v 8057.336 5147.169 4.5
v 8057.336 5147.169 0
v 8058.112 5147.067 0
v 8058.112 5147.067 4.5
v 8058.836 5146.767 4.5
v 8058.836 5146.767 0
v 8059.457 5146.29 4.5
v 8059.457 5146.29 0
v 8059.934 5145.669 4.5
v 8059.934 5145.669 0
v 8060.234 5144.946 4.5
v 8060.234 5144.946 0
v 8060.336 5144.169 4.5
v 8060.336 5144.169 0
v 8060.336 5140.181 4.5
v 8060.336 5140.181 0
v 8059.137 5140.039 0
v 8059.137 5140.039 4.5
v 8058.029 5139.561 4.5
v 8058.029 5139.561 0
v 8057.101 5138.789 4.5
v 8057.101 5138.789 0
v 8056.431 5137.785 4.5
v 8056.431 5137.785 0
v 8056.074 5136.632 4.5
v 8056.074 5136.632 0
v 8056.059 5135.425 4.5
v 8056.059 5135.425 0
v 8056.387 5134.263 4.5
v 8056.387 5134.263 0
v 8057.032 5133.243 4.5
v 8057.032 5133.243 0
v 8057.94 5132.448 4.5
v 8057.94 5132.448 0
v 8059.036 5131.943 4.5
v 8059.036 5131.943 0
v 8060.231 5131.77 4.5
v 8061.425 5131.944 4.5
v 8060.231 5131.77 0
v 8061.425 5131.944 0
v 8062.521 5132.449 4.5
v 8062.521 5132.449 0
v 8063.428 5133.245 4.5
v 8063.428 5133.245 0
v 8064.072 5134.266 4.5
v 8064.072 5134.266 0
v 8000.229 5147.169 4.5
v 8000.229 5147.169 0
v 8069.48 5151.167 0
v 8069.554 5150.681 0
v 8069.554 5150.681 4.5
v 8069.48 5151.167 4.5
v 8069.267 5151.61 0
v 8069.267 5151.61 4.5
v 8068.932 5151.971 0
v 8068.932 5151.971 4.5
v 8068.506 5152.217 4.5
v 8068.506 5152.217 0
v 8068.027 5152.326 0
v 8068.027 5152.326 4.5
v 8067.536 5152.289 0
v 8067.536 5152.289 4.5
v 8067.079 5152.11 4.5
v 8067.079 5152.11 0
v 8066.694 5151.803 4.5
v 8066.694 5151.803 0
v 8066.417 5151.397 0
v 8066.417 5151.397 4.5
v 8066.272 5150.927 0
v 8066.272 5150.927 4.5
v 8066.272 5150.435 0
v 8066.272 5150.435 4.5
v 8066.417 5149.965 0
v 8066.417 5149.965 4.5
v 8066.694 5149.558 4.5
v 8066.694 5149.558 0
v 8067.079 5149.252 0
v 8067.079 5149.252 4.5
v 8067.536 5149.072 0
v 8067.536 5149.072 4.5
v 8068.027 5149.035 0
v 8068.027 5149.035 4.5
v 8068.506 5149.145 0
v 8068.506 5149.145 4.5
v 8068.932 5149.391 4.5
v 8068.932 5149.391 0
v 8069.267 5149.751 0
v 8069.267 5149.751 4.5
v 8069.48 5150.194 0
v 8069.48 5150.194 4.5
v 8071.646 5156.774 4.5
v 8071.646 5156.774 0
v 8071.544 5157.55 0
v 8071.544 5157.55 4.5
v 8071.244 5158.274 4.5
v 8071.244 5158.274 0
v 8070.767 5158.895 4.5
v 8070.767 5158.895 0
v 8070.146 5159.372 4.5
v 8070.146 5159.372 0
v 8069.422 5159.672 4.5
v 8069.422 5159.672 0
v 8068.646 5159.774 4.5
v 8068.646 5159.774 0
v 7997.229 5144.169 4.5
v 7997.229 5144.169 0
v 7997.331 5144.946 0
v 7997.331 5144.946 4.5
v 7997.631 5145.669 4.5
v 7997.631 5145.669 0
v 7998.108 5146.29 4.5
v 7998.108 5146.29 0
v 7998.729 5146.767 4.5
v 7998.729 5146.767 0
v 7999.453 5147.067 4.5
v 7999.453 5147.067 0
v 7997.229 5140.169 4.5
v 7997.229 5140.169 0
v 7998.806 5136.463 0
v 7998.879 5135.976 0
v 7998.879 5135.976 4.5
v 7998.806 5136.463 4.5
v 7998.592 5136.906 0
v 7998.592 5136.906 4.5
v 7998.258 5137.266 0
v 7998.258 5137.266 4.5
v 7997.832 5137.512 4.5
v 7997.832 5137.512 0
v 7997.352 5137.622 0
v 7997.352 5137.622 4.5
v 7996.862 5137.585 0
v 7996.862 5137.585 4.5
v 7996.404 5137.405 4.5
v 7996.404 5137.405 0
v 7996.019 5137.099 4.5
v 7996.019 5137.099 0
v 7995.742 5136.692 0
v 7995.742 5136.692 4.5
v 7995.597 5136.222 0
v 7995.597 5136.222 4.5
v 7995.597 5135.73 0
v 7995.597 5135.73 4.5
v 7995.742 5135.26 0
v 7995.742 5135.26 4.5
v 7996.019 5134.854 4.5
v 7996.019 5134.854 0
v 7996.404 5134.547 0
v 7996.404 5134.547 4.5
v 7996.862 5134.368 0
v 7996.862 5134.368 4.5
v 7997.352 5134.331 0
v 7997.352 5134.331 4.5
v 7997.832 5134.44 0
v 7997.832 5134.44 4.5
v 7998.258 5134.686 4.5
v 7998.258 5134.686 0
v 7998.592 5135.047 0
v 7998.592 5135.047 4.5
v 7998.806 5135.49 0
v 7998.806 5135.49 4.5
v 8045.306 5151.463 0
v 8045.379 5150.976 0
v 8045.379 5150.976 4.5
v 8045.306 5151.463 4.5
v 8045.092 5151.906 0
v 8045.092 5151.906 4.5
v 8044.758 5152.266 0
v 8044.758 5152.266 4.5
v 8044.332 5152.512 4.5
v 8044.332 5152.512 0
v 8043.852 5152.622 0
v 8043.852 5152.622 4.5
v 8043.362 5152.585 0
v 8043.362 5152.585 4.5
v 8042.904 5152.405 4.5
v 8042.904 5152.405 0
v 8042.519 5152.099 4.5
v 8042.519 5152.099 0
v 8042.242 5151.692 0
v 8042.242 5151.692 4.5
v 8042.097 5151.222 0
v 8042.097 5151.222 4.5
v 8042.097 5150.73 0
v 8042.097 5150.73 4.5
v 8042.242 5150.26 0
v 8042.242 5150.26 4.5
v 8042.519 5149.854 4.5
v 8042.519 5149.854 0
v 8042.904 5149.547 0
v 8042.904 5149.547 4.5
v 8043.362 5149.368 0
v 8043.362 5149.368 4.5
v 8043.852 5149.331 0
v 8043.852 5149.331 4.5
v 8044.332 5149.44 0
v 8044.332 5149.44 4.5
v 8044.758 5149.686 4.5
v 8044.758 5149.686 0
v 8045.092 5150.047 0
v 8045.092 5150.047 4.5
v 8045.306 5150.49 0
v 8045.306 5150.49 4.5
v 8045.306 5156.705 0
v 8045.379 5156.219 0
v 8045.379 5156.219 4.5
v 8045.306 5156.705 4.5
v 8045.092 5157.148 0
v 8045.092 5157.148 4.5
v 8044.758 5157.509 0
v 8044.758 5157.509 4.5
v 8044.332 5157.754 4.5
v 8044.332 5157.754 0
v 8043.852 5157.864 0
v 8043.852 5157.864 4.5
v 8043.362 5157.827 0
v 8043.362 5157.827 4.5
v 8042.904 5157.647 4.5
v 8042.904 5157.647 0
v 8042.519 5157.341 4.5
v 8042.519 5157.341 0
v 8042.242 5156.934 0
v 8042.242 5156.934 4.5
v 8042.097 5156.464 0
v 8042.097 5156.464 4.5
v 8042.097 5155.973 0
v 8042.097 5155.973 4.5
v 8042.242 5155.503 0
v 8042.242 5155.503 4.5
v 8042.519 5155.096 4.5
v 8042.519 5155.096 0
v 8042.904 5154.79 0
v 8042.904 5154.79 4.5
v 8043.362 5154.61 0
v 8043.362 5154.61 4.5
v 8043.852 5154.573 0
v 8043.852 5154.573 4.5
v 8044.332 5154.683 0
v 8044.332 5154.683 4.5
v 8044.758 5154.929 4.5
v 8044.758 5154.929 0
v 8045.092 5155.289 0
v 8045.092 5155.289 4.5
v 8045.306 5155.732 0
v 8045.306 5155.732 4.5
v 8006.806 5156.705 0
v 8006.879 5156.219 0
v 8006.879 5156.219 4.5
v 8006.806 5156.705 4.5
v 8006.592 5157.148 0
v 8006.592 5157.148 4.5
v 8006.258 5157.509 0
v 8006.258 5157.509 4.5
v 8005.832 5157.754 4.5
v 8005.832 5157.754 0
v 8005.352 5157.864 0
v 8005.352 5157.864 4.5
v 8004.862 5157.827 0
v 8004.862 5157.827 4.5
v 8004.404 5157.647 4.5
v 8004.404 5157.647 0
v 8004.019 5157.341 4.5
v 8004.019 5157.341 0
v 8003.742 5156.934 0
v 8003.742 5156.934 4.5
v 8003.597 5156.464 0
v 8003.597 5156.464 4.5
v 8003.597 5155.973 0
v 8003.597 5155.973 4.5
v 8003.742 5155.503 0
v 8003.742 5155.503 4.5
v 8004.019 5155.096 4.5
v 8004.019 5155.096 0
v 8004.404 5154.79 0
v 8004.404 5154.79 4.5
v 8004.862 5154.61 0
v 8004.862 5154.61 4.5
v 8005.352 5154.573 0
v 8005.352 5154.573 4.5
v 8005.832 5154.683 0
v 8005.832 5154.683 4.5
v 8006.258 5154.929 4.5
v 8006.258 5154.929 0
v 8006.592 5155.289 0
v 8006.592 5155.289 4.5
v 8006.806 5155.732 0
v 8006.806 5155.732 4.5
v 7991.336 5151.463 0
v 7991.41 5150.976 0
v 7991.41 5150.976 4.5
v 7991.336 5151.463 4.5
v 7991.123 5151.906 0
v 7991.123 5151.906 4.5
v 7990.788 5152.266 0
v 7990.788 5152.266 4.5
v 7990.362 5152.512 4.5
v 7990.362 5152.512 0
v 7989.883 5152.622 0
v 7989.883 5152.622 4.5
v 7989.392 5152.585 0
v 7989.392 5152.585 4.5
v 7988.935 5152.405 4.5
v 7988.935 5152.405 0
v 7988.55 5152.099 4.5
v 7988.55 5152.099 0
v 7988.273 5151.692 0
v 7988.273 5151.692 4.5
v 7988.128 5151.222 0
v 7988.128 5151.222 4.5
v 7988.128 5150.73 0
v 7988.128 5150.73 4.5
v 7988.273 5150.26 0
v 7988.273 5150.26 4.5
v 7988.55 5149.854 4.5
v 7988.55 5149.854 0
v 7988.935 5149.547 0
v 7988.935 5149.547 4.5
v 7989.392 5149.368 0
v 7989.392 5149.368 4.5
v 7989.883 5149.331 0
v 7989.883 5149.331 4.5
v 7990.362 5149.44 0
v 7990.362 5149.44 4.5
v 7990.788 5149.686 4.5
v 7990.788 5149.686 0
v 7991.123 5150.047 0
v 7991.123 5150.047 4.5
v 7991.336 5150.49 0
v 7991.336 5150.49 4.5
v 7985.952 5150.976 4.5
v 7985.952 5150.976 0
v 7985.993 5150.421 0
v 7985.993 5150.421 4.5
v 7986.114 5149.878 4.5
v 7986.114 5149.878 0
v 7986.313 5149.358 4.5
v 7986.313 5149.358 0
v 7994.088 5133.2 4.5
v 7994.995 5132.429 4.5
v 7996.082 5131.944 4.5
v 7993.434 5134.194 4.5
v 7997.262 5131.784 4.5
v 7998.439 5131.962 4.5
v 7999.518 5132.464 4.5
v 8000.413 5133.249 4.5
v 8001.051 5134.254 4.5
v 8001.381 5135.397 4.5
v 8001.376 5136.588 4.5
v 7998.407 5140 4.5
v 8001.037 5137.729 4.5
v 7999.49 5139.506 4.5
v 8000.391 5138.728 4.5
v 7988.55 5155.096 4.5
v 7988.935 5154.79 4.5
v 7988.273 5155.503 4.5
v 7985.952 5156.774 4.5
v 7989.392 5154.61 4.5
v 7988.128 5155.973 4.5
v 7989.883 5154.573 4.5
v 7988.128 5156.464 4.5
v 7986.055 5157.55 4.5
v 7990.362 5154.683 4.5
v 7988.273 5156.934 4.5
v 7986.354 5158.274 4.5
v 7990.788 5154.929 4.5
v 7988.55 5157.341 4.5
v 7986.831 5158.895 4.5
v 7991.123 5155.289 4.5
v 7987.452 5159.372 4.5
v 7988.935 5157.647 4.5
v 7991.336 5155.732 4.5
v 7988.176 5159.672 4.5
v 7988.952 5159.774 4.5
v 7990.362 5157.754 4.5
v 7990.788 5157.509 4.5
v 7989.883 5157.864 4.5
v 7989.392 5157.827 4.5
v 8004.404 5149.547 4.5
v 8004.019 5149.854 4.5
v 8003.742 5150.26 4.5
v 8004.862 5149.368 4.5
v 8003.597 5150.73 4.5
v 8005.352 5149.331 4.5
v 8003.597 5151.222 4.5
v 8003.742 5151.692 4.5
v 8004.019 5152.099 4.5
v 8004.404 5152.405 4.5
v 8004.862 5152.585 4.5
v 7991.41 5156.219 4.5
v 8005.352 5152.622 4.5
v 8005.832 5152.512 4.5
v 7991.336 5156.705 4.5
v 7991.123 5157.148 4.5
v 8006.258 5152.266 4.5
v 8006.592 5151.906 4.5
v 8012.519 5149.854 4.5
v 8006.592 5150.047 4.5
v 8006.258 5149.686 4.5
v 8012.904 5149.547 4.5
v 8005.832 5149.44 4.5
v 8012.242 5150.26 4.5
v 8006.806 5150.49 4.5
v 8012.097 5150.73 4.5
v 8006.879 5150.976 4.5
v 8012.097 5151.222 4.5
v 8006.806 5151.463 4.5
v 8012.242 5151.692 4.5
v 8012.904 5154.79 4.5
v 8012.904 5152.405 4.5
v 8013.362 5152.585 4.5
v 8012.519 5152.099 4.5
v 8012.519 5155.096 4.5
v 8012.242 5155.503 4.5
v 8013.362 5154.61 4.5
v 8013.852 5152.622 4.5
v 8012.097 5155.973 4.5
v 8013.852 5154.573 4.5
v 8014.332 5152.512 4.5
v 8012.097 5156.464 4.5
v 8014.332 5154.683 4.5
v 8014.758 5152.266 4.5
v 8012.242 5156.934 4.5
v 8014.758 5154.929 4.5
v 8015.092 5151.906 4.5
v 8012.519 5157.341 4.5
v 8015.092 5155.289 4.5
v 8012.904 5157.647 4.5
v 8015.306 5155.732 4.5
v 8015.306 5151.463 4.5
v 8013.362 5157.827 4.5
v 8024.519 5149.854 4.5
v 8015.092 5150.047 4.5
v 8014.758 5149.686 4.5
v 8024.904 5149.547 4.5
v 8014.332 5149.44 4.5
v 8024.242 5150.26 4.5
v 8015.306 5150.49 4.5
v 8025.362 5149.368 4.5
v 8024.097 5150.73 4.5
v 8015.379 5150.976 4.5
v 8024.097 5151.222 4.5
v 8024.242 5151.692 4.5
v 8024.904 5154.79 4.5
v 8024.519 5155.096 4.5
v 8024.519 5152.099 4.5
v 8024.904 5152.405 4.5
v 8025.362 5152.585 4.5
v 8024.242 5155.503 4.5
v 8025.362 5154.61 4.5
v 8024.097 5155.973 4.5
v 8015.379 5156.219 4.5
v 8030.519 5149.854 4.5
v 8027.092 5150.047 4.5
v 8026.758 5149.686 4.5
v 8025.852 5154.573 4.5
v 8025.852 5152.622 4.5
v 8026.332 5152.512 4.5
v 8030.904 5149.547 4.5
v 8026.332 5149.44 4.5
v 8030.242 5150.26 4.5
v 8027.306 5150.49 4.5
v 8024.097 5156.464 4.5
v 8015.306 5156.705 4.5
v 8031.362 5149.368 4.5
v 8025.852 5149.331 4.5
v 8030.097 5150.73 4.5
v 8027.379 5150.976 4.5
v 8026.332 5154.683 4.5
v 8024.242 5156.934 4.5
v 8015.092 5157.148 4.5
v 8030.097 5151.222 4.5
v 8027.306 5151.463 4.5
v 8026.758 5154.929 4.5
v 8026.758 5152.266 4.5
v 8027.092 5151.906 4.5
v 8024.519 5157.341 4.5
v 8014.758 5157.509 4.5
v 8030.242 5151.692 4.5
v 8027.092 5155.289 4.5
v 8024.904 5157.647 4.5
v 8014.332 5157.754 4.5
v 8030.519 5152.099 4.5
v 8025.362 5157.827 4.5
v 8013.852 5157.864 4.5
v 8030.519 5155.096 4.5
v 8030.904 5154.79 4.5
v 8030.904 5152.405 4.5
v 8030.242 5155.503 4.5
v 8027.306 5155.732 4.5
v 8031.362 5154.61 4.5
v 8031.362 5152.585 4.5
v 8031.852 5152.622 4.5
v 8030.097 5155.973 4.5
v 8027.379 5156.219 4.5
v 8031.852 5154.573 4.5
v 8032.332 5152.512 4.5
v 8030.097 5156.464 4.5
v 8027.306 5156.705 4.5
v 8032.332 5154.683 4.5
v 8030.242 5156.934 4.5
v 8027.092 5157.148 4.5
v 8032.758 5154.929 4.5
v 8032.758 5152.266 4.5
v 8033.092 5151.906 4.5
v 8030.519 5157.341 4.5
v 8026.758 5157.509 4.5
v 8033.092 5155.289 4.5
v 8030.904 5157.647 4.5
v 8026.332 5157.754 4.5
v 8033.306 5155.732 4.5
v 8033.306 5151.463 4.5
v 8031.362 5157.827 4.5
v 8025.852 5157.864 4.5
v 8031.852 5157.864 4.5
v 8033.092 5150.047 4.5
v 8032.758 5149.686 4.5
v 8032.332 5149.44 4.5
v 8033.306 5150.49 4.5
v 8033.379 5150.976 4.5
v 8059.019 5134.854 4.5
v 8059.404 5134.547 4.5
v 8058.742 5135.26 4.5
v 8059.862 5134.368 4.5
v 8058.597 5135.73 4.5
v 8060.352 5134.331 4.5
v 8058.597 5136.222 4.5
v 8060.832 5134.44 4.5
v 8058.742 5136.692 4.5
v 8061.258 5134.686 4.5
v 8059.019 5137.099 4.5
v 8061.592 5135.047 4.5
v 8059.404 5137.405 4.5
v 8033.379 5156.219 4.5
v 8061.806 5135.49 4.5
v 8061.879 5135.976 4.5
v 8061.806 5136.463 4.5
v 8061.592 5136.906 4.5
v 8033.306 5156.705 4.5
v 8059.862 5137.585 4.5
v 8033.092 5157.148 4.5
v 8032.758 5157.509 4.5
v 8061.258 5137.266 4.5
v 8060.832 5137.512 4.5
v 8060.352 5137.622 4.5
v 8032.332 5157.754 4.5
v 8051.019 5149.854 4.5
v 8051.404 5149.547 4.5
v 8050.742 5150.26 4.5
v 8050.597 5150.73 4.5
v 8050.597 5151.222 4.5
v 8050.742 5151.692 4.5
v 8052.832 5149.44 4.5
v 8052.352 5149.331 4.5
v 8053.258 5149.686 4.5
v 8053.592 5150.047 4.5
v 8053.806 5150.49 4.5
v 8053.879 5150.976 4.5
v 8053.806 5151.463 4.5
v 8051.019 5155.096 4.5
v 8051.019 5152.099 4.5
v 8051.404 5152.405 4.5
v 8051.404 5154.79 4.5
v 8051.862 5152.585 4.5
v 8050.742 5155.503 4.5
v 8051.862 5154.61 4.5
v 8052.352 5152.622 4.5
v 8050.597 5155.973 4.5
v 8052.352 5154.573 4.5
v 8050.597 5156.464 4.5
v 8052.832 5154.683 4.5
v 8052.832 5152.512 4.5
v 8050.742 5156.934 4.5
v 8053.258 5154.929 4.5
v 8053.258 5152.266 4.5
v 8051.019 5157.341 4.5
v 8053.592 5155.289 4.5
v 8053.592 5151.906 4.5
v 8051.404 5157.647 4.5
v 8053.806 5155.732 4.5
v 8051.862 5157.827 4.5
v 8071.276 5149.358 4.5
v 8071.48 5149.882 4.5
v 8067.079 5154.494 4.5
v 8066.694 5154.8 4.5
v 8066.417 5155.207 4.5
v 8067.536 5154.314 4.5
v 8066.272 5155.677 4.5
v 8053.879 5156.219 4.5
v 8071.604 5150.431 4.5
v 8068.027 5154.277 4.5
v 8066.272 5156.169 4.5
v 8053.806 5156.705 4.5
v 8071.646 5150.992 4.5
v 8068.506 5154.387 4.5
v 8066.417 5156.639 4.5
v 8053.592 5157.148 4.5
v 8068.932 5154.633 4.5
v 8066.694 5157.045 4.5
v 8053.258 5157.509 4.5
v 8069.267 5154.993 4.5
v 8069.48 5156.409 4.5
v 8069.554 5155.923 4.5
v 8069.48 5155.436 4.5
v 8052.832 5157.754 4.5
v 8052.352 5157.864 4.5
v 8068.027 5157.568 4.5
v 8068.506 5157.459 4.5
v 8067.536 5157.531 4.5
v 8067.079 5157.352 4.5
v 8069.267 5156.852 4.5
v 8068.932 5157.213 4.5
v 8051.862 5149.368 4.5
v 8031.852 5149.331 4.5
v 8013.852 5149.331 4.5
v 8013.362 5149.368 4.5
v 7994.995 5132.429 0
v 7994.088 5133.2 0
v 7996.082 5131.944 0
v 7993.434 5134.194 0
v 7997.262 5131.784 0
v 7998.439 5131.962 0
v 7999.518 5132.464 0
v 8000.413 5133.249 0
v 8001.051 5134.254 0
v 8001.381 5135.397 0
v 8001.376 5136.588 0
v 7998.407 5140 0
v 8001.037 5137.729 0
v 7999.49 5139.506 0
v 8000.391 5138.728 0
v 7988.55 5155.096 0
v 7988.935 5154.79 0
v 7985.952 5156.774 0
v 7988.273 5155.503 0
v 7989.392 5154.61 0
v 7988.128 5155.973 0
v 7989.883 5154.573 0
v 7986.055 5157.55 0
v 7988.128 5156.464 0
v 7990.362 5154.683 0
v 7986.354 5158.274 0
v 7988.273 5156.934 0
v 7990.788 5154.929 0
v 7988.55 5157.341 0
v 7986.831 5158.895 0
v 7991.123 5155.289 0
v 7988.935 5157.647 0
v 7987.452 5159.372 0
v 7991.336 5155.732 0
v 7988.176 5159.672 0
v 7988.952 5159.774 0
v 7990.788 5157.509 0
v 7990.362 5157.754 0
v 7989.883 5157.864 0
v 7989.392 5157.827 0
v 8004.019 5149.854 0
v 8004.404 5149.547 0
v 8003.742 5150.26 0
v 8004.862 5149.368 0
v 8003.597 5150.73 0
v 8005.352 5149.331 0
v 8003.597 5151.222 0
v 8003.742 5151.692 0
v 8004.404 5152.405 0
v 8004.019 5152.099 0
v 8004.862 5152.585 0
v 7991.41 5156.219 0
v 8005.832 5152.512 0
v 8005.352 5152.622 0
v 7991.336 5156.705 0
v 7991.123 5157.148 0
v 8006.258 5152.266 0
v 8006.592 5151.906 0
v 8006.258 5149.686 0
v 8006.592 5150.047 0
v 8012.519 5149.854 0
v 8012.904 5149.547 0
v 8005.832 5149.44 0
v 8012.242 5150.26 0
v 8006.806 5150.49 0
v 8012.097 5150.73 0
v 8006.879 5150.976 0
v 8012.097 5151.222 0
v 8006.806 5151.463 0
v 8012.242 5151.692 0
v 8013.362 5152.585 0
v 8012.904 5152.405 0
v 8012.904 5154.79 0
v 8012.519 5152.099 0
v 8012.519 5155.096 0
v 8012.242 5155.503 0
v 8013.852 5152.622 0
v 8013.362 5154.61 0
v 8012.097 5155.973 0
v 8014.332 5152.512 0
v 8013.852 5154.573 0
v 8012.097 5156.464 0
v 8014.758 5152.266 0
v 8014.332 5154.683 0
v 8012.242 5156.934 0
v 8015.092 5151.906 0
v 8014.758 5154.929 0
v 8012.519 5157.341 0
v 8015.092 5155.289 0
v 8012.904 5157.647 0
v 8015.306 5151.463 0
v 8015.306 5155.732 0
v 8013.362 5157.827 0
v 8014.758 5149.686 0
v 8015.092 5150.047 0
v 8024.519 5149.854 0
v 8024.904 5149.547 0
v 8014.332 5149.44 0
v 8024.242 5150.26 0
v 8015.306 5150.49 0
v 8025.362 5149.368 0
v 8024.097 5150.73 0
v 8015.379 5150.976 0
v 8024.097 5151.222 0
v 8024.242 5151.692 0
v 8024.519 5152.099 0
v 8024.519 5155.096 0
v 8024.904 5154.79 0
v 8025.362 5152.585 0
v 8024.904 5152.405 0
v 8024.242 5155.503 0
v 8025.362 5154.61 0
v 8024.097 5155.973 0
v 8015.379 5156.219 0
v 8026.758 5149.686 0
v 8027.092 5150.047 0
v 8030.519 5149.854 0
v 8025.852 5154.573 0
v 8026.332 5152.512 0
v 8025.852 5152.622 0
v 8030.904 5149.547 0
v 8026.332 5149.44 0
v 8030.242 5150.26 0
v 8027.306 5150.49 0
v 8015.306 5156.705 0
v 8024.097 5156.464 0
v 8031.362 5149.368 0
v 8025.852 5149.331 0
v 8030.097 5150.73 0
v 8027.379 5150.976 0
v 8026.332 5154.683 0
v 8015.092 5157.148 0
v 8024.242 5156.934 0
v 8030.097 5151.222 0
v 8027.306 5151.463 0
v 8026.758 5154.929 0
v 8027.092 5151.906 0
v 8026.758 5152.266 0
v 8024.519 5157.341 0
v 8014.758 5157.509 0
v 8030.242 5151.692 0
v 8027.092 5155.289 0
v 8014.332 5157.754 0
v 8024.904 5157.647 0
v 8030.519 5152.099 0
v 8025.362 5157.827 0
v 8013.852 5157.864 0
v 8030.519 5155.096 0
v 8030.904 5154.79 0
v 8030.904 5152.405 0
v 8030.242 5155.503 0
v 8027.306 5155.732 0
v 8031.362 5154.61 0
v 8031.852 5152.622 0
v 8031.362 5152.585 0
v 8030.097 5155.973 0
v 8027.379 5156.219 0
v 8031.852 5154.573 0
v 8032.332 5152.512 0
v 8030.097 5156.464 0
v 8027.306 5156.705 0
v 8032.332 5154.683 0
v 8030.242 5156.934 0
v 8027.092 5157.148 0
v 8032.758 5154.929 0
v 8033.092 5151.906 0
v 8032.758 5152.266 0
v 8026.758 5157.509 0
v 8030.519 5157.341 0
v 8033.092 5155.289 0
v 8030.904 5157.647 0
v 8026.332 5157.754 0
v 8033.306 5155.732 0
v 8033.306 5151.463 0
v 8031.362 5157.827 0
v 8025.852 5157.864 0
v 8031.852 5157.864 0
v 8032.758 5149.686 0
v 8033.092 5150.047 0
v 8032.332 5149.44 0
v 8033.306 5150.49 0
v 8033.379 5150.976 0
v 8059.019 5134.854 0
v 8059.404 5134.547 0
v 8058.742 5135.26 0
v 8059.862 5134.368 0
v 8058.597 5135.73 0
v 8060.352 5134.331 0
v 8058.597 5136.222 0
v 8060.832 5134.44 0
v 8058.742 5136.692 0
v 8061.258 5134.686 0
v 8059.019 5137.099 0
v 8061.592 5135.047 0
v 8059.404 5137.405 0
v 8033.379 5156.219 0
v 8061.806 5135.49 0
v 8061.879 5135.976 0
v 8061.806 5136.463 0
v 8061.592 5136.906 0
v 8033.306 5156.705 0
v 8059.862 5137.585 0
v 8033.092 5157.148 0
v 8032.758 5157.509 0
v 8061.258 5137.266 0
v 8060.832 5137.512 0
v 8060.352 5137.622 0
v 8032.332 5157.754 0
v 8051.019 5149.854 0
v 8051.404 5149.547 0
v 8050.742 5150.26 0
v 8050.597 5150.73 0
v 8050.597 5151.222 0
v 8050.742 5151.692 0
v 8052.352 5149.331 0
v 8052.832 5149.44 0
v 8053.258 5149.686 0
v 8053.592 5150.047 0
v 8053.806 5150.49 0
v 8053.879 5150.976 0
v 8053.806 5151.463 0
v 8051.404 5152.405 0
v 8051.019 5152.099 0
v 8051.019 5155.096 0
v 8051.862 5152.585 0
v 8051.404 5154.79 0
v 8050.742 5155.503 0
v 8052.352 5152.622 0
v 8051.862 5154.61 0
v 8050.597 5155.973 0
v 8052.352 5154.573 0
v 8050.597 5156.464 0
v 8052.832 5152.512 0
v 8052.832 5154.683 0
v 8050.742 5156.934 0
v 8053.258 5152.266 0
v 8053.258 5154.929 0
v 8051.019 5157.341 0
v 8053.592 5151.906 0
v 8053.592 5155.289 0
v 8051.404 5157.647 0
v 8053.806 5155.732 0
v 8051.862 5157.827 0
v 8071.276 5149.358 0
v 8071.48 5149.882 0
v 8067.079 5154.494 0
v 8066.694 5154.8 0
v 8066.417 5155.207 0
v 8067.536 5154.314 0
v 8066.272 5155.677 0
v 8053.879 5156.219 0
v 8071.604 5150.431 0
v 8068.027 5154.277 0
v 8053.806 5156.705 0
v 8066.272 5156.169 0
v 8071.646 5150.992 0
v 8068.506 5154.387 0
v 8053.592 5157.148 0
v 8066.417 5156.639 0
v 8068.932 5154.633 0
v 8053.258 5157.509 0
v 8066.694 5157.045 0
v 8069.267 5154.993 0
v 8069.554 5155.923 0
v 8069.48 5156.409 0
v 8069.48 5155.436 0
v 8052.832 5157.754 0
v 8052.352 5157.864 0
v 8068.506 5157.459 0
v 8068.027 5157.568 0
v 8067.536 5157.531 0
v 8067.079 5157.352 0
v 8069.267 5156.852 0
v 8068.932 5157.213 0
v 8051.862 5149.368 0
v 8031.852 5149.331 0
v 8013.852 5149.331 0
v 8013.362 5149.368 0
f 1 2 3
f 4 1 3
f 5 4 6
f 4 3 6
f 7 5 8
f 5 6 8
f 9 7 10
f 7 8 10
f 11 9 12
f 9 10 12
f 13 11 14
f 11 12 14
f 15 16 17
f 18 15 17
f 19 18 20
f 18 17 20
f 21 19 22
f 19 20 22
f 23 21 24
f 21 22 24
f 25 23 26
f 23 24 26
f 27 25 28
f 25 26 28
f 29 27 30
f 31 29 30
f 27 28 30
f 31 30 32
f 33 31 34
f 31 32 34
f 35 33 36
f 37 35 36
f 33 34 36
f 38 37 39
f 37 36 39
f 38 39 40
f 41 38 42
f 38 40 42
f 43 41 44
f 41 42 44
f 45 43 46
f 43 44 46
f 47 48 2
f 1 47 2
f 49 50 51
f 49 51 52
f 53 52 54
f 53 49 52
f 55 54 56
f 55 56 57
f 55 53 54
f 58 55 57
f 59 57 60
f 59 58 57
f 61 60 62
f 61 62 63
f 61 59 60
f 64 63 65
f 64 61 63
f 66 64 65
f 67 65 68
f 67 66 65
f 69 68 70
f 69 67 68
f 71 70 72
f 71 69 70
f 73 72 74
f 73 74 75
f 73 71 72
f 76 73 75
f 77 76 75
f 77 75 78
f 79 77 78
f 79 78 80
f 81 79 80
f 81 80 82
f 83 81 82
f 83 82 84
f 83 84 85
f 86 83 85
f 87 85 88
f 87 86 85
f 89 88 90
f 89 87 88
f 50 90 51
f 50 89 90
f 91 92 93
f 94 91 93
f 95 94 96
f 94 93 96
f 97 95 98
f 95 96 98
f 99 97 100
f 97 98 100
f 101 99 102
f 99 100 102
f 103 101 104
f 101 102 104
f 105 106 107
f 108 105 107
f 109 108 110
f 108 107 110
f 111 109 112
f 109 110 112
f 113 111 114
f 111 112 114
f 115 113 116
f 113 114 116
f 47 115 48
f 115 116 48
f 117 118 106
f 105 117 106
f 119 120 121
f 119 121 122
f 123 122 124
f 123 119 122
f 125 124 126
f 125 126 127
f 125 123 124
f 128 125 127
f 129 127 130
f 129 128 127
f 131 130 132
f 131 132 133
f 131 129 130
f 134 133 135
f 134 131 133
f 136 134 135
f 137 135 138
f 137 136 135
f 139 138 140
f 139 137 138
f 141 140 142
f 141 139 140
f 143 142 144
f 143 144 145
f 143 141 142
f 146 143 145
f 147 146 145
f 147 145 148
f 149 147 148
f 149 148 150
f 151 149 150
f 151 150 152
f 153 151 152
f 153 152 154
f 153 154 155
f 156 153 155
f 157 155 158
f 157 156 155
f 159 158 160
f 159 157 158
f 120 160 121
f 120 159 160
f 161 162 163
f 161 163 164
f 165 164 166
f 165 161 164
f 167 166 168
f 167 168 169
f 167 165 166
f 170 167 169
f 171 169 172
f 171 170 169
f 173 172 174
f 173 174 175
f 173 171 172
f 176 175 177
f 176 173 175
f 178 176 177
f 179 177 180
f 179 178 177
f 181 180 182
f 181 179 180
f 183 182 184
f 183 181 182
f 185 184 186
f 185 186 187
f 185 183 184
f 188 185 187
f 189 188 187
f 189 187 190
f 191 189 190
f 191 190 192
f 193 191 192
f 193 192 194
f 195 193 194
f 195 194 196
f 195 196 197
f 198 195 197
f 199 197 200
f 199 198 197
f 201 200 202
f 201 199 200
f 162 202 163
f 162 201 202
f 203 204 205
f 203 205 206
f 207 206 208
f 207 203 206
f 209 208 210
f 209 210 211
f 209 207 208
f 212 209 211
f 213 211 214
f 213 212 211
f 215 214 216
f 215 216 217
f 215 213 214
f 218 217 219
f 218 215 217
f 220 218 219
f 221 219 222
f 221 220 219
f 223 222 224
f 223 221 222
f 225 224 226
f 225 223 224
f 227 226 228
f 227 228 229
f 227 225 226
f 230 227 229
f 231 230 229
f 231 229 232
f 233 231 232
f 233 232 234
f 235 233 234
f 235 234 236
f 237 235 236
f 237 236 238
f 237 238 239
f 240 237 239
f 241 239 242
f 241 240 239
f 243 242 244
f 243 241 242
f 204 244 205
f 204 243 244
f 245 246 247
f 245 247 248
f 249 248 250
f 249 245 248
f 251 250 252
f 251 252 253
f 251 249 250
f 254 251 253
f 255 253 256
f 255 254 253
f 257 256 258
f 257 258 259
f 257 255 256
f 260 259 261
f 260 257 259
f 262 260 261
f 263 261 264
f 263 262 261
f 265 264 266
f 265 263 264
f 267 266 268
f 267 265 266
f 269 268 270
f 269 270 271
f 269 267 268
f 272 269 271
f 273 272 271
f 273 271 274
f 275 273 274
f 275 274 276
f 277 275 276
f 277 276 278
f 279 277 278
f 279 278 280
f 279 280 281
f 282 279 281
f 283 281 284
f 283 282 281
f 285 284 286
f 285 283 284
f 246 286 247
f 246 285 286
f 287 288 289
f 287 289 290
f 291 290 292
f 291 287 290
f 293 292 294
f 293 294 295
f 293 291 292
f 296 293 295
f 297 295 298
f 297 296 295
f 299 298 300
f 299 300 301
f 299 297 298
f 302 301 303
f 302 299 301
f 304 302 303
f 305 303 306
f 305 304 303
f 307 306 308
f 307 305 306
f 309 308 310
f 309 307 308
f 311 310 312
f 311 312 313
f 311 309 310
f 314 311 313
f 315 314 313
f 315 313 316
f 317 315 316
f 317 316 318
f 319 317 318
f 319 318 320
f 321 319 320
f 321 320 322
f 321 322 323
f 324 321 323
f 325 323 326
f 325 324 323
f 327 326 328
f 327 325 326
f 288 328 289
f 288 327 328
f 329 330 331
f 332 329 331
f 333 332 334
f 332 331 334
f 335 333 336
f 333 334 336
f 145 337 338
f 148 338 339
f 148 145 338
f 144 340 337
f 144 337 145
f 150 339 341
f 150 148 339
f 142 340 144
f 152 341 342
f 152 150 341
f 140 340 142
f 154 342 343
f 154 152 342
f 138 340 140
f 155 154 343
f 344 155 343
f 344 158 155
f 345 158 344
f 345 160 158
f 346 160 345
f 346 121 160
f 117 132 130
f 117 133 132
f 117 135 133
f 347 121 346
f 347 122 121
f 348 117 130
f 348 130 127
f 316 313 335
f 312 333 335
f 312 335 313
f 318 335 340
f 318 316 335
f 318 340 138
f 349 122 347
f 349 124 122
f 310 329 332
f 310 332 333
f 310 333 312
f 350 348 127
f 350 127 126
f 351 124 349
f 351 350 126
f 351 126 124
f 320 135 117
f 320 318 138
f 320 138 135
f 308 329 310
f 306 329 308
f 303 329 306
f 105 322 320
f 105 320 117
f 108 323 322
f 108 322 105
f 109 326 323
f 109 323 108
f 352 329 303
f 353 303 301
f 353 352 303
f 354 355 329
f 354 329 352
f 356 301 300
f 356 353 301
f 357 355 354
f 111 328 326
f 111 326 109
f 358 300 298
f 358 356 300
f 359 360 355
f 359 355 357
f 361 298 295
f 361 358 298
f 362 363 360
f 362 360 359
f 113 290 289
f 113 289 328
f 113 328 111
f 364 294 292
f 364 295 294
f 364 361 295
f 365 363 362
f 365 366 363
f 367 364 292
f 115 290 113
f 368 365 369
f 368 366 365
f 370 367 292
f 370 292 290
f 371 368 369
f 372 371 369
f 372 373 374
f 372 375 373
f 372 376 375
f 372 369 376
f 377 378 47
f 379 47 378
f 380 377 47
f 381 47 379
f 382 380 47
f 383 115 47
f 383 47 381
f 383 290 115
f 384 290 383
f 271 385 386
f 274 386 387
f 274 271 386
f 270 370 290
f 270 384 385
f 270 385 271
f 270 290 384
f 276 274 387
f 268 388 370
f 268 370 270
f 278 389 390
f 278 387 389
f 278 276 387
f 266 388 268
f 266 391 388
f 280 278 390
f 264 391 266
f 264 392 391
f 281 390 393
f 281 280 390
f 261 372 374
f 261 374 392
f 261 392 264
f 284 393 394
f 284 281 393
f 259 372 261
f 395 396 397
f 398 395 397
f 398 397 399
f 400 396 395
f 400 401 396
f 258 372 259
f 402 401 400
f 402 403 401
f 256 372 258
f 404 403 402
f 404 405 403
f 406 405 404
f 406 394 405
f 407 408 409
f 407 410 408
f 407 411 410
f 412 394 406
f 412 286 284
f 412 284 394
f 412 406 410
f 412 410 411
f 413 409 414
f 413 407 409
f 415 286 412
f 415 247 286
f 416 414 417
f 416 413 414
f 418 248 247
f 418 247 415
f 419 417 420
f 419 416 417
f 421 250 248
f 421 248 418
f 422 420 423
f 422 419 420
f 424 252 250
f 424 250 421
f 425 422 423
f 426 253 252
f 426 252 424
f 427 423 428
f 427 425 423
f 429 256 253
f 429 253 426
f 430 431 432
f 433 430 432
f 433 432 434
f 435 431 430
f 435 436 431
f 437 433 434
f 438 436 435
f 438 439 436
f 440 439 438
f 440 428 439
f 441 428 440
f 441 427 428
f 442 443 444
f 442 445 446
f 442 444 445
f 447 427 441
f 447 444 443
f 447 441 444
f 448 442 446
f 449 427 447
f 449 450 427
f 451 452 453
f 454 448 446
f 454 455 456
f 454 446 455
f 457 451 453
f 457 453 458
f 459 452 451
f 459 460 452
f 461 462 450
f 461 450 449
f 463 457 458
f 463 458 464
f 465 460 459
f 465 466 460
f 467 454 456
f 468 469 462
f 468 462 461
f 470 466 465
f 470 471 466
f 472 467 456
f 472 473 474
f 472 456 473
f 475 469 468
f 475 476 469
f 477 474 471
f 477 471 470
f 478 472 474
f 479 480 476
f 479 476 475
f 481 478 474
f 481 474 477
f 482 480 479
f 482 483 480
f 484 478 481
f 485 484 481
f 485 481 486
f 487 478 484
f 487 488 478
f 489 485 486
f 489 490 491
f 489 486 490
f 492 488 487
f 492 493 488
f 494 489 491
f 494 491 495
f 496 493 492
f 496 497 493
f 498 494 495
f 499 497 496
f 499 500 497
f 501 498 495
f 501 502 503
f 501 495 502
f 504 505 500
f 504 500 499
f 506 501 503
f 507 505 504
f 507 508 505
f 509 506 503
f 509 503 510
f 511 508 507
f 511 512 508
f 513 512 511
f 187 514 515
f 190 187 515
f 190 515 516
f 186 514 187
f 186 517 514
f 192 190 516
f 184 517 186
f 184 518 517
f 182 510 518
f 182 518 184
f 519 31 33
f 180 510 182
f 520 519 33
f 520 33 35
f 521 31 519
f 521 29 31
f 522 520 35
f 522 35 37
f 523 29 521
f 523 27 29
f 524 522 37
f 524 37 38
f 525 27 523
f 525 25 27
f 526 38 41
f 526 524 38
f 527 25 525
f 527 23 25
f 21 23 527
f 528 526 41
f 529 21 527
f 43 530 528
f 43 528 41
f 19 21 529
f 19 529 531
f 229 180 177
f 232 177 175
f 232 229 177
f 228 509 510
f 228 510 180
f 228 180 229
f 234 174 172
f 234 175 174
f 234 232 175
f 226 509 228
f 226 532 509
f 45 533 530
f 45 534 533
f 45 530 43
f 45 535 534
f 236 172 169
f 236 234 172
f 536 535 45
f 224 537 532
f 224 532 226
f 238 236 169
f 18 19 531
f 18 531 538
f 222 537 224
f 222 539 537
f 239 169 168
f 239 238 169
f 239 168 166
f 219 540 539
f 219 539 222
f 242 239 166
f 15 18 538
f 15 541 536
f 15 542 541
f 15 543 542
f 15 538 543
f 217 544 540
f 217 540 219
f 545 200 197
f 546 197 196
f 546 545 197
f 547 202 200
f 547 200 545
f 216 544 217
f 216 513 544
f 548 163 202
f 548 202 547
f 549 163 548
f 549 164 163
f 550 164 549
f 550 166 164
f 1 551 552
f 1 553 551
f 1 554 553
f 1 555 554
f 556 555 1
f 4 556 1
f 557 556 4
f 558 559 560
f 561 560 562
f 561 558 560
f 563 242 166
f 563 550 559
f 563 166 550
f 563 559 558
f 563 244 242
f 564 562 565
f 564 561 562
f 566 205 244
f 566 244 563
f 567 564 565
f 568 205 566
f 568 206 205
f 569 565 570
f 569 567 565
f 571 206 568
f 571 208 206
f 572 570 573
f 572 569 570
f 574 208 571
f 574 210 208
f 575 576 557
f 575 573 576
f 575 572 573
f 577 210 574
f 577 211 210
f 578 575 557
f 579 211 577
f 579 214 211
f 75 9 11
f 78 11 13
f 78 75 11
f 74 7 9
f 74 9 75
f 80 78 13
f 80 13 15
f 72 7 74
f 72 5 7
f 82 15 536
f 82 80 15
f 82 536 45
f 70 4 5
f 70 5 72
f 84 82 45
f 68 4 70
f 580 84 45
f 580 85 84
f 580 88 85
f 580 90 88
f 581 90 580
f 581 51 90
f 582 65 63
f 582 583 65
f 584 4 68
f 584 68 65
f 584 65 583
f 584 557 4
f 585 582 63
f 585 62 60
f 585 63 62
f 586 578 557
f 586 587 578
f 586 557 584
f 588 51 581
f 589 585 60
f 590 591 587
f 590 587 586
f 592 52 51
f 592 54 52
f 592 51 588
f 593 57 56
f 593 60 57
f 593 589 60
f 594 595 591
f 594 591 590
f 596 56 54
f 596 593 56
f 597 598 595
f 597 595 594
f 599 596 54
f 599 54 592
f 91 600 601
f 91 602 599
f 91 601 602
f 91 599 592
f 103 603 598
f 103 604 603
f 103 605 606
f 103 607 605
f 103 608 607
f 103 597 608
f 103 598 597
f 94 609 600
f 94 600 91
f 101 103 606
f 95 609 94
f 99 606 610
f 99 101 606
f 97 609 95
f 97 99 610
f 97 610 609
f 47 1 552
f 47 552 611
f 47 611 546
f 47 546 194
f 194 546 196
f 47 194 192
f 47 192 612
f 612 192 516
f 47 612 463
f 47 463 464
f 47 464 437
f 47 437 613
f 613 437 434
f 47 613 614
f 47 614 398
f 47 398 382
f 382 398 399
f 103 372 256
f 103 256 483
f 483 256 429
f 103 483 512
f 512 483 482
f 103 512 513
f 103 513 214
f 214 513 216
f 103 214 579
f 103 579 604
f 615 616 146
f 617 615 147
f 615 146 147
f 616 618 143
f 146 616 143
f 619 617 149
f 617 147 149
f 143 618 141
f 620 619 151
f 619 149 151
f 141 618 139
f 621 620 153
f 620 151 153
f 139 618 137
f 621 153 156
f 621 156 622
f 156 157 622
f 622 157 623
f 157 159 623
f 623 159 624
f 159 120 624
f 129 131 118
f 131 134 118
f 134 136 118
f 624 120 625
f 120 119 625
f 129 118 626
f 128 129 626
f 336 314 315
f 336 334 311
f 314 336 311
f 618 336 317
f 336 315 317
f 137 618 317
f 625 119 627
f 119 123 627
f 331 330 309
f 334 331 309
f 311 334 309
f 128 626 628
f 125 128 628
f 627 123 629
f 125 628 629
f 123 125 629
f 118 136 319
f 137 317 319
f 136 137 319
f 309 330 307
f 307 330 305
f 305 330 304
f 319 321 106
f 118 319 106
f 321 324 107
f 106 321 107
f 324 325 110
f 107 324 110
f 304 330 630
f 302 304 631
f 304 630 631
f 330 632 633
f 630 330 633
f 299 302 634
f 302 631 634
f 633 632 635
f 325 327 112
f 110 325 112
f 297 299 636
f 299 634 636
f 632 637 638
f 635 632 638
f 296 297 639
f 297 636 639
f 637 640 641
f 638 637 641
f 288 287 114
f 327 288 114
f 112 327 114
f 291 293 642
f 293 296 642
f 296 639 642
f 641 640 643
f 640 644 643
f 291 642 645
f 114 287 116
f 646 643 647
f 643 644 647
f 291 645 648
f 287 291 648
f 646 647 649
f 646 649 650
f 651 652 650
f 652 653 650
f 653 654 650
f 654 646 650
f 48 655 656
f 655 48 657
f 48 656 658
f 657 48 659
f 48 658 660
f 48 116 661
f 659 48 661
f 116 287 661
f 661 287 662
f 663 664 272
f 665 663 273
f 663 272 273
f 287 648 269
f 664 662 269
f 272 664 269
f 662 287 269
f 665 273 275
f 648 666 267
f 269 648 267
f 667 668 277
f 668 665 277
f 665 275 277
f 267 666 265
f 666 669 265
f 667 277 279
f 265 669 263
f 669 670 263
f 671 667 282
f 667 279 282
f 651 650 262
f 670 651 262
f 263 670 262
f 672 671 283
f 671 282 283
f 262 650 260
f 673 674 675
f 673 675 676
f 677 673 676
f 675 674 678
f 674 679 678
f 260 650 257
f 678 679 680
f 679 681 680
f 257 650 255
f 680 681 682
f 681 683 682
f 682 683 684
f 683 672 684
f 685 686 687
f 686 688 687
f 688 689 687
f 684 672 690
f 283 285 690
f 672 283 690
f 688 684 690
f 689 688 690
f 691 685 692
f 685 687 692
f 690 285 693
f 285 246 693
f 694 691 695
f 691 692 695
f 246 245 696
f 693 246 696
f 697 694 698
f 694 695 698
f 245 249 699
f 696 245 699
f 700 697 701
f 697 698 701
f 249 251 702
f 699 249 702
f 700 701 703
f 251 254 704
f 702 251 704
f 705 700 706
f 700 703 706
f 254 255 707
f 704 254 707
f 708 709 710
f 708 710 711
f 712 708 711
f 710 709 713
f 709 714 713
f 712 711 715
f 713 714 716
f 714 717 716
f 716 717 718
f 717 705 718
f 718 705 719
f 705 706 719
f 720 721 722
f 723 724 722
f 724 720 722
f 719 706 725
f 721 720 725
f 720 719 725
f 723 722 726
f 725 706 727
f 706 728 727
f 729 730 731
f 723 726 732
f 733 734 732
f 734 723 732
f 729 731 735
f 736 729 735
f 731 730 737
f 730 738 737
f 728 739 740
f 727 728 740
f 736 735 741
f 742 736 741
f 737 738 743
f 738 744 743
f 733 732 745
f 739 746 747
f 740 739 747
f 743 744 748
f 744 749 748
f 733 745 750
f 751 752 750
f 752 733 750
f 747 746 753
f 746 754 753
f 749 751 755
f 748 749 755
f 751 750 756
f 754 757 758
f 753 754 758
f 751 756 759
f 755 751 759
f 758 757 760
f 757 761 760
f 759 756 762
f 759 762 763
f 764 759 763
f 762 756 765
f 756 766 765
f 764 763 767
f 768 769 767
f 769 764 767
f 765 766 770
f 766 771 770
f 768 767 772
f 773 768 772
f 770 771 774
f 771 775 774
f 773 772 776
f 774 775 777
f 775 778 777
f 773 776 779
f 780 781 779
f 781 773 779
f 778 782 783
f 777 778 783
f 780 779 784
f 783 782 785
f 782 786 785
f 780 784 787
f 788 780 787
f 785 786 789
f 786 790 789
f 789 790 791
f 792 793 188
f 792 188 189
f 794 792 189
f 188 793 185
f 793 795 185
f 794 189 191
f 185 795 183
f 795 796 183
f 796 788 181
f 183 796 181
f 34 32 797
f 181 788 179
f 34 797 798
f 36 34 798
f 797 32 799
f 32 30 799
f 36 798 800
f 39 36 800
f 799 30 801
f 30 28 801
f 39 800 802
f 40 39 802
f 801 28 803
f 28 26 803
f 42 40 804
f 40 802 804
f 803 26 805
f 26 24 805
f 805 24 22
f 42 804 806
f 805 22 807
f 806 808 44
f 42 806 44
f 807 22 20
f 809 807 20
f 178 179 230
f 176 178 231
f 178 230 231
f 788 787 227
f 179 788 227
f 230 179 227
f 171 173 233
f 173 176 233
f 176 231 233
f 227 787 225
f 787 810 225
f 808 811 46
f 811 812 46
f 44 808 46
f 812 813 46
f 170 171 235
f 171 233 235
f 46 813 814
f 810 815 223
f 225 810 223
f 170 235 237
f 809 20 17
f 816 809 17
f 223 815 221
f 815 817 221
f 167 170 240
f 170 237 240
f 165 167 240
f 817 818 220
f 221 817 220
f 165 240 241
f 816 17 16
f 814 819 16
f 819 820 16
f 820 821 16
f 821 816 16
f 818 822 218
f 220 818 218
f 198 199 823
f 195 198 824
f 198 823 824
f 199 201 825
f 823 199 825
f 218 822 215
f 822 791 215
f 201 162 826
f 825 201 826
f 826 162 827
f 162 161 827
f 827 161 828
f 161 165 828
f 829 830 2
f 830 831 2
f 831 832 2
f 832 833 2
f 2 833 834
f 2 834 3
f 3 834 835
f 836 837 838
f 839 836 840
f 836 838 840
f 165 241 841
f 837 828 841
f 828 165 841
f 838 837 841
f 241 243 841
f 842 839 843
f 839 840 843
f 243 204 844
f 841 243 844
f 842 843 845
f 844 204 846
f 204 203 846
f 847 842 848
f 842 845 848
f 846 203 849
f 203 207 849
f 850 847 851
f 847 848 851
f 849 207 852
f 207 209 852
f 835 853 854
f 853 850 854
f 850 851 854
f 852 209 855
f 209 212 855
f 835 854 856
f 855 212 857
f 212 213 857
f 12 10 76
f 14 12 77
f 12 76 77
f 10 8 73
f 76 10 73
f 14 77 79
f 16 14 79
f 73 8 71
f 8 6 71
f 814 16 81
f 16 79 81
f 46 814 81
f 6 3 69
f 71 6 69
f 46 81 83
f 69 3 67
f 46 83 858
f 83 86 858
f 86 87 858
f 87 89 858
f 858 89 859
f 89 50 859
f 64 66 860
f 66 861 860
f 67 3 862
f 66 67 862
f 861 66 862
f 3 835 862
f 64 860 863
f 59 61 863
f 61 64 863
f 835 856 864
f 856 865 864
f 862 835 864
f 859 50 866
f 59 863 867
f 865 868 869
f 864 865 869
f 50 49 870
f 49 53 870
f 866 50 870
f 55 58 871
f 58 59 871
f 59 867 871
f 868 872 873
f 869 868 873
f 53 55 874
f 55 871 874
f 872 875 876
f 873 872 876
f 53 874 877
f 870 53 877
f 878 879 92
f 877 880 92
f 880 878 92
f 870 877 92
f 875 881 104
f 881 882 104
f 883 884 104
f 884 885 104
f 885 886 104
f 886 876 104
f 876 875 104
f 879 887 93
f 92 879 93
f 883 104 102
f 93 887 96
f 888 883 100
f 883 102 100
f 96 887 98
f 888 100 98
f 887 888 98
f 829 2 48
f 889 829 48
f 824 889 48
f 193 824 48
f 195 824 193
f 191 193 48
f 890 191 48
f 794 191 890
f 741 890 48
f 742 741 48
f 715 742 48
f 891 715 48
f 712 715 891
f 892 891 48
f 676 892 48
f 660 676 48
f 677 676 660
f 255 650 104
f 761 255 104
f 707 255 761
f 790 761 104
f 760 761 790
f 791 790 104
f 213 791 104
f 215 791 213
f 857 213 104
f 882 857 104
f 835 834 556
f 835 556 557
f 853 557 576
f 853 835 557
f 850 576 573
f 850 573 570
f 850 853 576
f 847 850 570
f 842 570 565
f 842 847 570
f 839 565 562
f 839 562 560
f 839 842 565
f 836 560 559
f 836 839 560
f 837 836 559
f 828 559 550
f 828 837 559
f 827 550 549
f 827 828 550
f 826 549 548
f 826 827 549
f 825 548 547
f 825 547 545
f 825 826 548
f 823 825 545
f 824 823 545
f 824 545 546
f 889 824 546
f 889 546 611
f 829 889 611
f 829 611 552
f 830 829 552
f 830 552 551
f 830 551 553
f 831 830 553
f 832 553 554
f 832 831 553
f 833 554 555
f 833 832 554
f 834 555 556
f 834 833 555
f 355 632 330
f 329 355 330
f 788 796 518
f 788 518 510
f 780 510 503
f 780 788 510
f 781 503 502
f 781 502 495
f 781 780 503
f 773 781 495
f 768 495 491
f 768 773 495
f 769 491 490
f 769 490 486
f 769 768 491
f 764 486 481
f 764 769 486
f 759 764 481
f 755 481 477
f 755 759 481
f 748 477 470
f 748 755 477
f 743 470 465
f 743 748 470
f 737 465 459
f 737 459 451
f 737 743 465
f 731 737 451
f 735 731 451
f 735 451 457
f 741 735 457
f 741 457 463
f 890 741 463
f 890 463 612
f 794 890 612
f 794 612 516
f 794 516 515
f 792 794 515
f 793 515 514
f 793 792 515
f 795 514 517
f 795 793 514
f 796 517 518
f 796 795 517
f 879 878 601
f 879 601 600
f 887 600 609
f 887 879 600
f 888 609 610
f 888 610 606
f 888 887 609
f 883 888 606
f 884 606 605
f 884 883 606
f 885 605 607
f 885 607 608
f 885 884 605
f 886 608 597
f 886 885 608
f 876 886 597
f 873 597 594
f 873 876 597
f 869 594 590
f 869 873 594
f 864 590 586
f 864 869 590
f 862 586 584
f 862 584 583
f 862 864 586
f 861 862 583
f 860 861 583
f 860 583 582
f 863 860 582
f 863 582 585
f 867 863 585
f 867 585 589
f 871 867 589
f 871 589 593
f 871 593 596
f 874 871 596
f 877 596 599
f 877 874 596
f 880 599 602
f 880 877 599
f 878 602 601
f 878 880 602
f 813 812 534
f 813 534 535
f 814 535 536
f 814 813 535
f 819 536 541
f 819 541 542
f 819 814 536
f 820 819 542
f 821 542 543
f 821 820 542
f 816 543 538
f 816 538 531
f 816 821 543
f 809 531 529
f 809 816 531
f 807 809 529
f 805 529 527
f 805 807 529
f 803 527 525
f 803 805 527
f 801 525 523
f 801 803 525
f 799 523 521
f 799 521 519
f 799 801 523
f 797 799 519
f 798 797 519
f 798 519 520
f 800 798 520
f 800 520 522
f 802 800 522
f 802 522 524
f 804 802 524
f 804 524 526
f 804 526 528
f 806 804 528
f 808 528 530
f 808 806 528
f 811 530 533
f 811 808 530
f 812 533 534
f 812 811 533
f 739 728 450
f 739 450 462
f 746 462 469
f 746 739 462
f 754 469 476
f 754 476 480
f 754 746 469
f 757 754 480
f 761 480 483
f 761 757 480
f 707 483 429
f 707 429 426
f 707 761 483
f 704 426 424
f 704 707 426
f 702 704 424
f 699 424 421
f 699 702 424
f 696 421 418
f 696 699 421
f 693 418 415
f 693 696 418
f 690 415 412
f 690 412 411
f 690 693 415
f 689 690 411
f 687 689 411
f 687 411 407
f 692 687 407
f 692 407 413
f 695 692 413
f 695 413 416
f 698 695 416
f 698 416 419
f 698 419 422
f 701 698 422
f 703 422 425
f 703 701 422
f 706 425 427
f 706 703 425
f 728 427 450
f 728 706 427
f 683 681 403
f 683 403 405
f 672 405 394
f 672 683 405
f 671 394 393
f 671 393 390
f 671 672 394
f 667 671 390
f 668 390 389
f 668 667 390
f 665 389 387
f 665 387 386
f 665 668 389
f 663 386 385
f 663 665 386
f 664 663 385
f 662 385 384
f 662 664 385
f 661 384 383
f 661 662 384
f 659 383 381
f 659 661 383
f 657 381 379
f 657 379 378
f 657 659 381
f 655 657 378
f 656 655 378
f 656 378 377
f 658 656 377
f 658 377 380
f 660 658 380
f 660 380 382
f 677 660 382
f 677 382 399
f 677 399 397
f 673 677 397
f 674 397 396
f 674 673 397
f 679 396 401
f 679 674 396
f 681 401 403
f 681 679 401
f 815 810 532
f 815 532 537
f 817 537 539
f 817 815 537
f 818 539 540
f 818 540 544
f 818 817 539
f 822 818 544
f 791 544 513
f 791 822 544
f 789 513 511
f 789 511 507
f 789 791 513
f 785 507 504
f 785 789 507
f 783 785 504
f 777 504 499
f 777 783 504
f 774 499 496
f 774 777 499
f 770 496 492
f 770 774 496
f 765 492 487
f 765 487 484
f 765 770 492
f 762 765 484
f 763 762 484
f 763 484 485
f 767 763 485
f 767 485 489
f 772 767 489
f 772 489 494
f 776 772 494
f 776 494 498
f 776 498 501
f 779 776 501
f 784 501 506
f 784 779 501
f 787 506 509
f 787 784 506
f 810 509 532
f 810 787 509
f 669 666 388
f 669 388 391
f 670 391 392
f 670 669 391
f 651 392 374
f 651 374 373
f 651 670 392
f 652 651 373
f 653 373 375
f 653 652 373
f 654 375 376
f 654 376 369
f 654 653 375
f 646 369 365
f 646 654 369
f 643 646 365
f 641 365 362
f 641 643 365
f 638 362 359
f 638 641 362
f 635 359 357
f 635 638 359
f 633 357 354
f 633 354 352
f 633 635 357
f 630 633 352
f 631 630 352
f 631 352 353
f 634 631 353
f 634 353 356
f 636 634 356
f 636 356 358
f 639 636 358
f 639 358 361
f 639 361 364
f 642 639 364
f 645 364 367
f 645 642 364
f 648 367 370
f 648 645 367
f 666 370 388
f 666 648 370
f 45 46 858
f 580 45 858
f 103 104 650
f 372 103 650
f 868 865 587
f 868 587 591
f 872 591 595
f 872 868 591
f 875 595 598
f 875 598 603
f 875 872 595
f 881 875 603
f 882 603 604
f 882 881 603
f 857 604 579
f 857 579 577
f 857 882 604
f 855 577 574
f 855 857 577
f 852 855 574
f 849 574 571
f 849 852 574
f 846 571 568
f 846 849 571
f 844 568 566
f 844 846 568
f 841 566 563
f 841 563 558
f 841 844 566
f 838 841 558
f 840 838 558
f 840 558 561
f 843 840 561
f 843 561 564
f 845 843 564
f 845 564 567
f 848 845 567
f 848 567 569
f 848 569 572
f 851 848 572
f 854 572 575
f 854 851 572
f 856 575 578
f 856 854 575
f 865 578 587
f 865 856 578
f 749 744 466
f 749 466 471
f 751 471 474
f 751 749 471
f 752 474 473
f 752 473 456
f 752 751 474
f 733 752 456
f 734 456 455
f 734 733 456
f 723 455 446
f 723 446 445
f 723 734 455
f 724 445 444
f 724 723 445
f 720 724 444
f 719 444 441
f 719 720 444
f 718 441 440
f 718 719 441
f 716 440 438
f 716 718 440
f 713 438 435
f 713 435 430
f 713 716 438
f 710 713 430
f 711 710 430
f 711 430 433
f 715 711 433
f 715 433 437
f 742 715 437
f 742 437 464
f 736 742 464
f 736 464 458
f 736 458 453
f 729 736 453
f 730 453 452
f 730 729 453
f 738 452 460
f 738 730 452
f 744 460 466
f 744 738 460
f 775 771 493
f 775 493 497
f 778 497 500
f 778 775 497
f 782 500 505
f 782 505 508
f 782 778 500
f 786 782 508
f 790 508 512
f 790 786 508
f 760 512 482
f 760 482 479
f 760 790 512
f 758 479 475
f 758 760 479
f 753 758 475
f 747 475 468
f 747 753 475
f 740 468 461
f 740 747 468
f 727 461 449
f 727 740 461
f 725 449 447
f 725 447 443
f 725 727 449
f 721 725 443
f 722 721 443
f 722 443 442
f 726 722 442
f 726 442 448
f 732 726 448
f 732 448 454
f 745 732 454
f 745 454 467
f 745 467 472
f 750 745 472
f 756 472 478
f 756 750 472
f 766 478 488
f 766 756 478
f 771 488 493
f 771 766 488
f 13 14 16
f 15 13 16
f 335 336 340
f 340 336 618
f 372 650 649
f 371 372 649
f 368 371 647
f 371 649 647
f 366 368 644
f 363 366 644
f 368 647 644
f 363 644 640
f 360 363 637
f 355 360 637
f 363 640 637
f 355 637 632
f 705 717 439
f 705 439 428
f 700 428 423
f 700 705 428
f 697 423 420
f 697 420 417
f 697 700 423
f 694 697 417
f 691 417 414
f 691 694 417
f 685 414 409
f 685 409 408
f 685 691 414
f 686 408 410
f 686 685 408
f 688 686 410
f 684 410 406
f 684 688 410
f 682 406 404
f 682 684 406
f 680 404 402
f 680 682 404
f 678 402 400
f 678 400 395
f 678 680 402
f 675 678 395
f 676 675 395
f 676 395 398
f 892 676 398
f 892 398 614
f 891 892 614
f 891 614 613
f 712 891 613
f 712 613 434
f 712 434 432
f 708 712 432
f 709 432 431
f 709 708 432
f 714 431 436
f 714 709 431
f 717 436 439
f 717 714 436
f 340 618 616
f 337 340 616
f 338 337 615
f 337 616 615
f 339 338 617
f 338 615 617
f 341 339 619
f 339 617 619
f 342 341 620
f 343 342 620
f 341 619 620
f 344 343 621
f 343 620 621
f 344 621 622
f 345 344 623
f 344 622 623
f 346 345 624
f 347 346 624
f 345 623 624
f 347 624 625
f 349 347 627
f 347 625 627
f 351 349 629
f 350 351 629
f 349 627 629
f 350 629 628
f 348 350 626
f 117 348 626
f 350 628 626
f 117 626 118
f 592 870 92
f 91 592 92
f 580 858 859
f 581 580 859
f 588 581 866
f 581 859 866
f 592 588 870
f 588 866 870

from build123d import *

# Parameters (mm, degrees)
SKETCH_1_R      = 1.65
EXTRUDE_1_DEPTH = 4.5


with BuildPart() as part:
    # 草图1 → 凸台-拉伸1 (new body)
    with BuildSketch(Plane.XY):
        with BuildLine():
            Line((7985.952332202, 5156.773837904), (7985.952332202, 5150.976359203))
            ThreePointArc((7985.952332202, 5150.976359203), (7986.043696587, 5150.147298626), (7986.313404682, 5149.358029069))
            Line((7986.313404682, 5149.358029069), (7993.434341187, 5134.194369164))
            ThreePointArc((7993.434341187, 5134.194369164), (8000.767739464, 5133.728654178), (7997.228995286, 5140.168600636))
            Line((7997.228995286, 5140.168600636), (7997.228995286, 5144.169137786))
            ThreePointArc((7997.228995286, 5144.169137786), (7998.107674943, 5146.290458129), (8000.228995286, 5147.169137786))
            Line((8000.228995286, 5147.169137786), (8057.335847124, 5147.169137786))
            ThreePointArc((8057.335847124, 5147.169137786), (8059.457167467, 5146.290458129), (8060.335847124, 5144.169137786))
            Line((8060.335847124, 5144.169137786), (8060.335847124, 5140.181434516))
            ThreePointArc((8060.335847124, 5140.181434516), (8056.672629109, 5133.729954227), (8064.072159737, 5134.266340868))
            Line((8064.072159737, 5134.266340868), (8071.275990148, 5149.357818804))
            ThreePointArc((8071.275990148, 5149.357818804), (8071.552278457, 5150.153987911), (8071.645915883, 5150.991515528))
            Line((8071.645915883, 5150.991515528), (8071.645915883, 5156.773837904))
            ThreePointArc((8071.645915883, 5156.773837904), (8070.767236227, 5158.895158248), (8068.645915883, 5159.773837904))
            Line((8068.645915883, 5159.773837904), (7988.952332202, 5159.773837904))
            ThreePointArc((7988.952332202, 5159.773837904), (7986.831011858, 5158.895158248), (7985.952332202, 5156.773837904))
        make_face()
        with Locations((7997.228995286, 5135.976359203)):
            Circle(SKETCH_1_R, mode=Mode.SUBTRACT)
        with Locations((8005.228995286, 5150.976359203)):
            Circle(SKETCH_1_R, mode=Mode.SUBTRACT)
        with Locations((8052.228995286, 5150.976359203)):
            Circle(SKETCH_1_R, mode=Mode.SUBTRACT)
        with Locations((8013.728995286, 5150.976359203)):
            Circle(SKETCH_1_R, mode=Mode.SUBTRACT)
        with Locations((8043.728995286, 5150.976359203)):
            Circle(SKETCH_1_R, mode=Mode.SUBTRACT)
        with Locations((8060.228995286, 5135.976359203)):
            Circle(SKETCH_1_R, mode=Mode.SUBTRACT)
        with Locations((7989.759553619, 5150.976359203)):
            Circle(SKETCH_1_R, mode=Mode.SUBTRACT)
        with Locations((8067.903645142, 5150.680599992)):
            Circle(SKETCH_1_R, mode=Mode.SUBTRACT)
        with Locations((8025.728995286, 5150.976359203)):
            Circle(SKETCH_1_R, mode=Mode.SUBTRACT)
        with Locations((8031.728995286, 5150.976359203)):
            Circle(SKETCH_1_R, mode=Mode.SUBTRACT)
        with Locations((8005.228995286, 5156.218532456)):
            Circle(SKETCH_1_R, mode=Mode.SUBTRACT)
        with Locations((8052.228995286, 5156.218532456)):
            Circle(SKETCH_1_R, mode=Mode.SUBTRACT)
        with Locations((8013.728995286, 5156.218532456)):
            Circle(SKETCH_1_R, mode=Mode.SUBTRACT)
        with Locations((8043.728995286, 5156.218532456)):
            Circle(SKETCH_1_R, mode=Mode.SUBTRACT)
        with Locations((7989.759553619, 5156.218532456)):
            Circle(SKETCH_1_R, mode=Mode.SUBTRACT)
        with Locations((8067.903645142, 5155.922773245)):
            Circle(SKETCH_1_R, mode=Mode.SUBTRACT)
        with Locations((8025.728995286, 5156.218532456)):
            Circle(SKETCH_1_R, mode=Mode.SUBTRACT)
        with Locations((8031.728995286, 5156.218532456)):
            Circle(SKETCH_1_R, mode=Mode.SUBTRACT)
    extrude(amount=EXTRUDE_1_DEPTH)


solid = part.part
